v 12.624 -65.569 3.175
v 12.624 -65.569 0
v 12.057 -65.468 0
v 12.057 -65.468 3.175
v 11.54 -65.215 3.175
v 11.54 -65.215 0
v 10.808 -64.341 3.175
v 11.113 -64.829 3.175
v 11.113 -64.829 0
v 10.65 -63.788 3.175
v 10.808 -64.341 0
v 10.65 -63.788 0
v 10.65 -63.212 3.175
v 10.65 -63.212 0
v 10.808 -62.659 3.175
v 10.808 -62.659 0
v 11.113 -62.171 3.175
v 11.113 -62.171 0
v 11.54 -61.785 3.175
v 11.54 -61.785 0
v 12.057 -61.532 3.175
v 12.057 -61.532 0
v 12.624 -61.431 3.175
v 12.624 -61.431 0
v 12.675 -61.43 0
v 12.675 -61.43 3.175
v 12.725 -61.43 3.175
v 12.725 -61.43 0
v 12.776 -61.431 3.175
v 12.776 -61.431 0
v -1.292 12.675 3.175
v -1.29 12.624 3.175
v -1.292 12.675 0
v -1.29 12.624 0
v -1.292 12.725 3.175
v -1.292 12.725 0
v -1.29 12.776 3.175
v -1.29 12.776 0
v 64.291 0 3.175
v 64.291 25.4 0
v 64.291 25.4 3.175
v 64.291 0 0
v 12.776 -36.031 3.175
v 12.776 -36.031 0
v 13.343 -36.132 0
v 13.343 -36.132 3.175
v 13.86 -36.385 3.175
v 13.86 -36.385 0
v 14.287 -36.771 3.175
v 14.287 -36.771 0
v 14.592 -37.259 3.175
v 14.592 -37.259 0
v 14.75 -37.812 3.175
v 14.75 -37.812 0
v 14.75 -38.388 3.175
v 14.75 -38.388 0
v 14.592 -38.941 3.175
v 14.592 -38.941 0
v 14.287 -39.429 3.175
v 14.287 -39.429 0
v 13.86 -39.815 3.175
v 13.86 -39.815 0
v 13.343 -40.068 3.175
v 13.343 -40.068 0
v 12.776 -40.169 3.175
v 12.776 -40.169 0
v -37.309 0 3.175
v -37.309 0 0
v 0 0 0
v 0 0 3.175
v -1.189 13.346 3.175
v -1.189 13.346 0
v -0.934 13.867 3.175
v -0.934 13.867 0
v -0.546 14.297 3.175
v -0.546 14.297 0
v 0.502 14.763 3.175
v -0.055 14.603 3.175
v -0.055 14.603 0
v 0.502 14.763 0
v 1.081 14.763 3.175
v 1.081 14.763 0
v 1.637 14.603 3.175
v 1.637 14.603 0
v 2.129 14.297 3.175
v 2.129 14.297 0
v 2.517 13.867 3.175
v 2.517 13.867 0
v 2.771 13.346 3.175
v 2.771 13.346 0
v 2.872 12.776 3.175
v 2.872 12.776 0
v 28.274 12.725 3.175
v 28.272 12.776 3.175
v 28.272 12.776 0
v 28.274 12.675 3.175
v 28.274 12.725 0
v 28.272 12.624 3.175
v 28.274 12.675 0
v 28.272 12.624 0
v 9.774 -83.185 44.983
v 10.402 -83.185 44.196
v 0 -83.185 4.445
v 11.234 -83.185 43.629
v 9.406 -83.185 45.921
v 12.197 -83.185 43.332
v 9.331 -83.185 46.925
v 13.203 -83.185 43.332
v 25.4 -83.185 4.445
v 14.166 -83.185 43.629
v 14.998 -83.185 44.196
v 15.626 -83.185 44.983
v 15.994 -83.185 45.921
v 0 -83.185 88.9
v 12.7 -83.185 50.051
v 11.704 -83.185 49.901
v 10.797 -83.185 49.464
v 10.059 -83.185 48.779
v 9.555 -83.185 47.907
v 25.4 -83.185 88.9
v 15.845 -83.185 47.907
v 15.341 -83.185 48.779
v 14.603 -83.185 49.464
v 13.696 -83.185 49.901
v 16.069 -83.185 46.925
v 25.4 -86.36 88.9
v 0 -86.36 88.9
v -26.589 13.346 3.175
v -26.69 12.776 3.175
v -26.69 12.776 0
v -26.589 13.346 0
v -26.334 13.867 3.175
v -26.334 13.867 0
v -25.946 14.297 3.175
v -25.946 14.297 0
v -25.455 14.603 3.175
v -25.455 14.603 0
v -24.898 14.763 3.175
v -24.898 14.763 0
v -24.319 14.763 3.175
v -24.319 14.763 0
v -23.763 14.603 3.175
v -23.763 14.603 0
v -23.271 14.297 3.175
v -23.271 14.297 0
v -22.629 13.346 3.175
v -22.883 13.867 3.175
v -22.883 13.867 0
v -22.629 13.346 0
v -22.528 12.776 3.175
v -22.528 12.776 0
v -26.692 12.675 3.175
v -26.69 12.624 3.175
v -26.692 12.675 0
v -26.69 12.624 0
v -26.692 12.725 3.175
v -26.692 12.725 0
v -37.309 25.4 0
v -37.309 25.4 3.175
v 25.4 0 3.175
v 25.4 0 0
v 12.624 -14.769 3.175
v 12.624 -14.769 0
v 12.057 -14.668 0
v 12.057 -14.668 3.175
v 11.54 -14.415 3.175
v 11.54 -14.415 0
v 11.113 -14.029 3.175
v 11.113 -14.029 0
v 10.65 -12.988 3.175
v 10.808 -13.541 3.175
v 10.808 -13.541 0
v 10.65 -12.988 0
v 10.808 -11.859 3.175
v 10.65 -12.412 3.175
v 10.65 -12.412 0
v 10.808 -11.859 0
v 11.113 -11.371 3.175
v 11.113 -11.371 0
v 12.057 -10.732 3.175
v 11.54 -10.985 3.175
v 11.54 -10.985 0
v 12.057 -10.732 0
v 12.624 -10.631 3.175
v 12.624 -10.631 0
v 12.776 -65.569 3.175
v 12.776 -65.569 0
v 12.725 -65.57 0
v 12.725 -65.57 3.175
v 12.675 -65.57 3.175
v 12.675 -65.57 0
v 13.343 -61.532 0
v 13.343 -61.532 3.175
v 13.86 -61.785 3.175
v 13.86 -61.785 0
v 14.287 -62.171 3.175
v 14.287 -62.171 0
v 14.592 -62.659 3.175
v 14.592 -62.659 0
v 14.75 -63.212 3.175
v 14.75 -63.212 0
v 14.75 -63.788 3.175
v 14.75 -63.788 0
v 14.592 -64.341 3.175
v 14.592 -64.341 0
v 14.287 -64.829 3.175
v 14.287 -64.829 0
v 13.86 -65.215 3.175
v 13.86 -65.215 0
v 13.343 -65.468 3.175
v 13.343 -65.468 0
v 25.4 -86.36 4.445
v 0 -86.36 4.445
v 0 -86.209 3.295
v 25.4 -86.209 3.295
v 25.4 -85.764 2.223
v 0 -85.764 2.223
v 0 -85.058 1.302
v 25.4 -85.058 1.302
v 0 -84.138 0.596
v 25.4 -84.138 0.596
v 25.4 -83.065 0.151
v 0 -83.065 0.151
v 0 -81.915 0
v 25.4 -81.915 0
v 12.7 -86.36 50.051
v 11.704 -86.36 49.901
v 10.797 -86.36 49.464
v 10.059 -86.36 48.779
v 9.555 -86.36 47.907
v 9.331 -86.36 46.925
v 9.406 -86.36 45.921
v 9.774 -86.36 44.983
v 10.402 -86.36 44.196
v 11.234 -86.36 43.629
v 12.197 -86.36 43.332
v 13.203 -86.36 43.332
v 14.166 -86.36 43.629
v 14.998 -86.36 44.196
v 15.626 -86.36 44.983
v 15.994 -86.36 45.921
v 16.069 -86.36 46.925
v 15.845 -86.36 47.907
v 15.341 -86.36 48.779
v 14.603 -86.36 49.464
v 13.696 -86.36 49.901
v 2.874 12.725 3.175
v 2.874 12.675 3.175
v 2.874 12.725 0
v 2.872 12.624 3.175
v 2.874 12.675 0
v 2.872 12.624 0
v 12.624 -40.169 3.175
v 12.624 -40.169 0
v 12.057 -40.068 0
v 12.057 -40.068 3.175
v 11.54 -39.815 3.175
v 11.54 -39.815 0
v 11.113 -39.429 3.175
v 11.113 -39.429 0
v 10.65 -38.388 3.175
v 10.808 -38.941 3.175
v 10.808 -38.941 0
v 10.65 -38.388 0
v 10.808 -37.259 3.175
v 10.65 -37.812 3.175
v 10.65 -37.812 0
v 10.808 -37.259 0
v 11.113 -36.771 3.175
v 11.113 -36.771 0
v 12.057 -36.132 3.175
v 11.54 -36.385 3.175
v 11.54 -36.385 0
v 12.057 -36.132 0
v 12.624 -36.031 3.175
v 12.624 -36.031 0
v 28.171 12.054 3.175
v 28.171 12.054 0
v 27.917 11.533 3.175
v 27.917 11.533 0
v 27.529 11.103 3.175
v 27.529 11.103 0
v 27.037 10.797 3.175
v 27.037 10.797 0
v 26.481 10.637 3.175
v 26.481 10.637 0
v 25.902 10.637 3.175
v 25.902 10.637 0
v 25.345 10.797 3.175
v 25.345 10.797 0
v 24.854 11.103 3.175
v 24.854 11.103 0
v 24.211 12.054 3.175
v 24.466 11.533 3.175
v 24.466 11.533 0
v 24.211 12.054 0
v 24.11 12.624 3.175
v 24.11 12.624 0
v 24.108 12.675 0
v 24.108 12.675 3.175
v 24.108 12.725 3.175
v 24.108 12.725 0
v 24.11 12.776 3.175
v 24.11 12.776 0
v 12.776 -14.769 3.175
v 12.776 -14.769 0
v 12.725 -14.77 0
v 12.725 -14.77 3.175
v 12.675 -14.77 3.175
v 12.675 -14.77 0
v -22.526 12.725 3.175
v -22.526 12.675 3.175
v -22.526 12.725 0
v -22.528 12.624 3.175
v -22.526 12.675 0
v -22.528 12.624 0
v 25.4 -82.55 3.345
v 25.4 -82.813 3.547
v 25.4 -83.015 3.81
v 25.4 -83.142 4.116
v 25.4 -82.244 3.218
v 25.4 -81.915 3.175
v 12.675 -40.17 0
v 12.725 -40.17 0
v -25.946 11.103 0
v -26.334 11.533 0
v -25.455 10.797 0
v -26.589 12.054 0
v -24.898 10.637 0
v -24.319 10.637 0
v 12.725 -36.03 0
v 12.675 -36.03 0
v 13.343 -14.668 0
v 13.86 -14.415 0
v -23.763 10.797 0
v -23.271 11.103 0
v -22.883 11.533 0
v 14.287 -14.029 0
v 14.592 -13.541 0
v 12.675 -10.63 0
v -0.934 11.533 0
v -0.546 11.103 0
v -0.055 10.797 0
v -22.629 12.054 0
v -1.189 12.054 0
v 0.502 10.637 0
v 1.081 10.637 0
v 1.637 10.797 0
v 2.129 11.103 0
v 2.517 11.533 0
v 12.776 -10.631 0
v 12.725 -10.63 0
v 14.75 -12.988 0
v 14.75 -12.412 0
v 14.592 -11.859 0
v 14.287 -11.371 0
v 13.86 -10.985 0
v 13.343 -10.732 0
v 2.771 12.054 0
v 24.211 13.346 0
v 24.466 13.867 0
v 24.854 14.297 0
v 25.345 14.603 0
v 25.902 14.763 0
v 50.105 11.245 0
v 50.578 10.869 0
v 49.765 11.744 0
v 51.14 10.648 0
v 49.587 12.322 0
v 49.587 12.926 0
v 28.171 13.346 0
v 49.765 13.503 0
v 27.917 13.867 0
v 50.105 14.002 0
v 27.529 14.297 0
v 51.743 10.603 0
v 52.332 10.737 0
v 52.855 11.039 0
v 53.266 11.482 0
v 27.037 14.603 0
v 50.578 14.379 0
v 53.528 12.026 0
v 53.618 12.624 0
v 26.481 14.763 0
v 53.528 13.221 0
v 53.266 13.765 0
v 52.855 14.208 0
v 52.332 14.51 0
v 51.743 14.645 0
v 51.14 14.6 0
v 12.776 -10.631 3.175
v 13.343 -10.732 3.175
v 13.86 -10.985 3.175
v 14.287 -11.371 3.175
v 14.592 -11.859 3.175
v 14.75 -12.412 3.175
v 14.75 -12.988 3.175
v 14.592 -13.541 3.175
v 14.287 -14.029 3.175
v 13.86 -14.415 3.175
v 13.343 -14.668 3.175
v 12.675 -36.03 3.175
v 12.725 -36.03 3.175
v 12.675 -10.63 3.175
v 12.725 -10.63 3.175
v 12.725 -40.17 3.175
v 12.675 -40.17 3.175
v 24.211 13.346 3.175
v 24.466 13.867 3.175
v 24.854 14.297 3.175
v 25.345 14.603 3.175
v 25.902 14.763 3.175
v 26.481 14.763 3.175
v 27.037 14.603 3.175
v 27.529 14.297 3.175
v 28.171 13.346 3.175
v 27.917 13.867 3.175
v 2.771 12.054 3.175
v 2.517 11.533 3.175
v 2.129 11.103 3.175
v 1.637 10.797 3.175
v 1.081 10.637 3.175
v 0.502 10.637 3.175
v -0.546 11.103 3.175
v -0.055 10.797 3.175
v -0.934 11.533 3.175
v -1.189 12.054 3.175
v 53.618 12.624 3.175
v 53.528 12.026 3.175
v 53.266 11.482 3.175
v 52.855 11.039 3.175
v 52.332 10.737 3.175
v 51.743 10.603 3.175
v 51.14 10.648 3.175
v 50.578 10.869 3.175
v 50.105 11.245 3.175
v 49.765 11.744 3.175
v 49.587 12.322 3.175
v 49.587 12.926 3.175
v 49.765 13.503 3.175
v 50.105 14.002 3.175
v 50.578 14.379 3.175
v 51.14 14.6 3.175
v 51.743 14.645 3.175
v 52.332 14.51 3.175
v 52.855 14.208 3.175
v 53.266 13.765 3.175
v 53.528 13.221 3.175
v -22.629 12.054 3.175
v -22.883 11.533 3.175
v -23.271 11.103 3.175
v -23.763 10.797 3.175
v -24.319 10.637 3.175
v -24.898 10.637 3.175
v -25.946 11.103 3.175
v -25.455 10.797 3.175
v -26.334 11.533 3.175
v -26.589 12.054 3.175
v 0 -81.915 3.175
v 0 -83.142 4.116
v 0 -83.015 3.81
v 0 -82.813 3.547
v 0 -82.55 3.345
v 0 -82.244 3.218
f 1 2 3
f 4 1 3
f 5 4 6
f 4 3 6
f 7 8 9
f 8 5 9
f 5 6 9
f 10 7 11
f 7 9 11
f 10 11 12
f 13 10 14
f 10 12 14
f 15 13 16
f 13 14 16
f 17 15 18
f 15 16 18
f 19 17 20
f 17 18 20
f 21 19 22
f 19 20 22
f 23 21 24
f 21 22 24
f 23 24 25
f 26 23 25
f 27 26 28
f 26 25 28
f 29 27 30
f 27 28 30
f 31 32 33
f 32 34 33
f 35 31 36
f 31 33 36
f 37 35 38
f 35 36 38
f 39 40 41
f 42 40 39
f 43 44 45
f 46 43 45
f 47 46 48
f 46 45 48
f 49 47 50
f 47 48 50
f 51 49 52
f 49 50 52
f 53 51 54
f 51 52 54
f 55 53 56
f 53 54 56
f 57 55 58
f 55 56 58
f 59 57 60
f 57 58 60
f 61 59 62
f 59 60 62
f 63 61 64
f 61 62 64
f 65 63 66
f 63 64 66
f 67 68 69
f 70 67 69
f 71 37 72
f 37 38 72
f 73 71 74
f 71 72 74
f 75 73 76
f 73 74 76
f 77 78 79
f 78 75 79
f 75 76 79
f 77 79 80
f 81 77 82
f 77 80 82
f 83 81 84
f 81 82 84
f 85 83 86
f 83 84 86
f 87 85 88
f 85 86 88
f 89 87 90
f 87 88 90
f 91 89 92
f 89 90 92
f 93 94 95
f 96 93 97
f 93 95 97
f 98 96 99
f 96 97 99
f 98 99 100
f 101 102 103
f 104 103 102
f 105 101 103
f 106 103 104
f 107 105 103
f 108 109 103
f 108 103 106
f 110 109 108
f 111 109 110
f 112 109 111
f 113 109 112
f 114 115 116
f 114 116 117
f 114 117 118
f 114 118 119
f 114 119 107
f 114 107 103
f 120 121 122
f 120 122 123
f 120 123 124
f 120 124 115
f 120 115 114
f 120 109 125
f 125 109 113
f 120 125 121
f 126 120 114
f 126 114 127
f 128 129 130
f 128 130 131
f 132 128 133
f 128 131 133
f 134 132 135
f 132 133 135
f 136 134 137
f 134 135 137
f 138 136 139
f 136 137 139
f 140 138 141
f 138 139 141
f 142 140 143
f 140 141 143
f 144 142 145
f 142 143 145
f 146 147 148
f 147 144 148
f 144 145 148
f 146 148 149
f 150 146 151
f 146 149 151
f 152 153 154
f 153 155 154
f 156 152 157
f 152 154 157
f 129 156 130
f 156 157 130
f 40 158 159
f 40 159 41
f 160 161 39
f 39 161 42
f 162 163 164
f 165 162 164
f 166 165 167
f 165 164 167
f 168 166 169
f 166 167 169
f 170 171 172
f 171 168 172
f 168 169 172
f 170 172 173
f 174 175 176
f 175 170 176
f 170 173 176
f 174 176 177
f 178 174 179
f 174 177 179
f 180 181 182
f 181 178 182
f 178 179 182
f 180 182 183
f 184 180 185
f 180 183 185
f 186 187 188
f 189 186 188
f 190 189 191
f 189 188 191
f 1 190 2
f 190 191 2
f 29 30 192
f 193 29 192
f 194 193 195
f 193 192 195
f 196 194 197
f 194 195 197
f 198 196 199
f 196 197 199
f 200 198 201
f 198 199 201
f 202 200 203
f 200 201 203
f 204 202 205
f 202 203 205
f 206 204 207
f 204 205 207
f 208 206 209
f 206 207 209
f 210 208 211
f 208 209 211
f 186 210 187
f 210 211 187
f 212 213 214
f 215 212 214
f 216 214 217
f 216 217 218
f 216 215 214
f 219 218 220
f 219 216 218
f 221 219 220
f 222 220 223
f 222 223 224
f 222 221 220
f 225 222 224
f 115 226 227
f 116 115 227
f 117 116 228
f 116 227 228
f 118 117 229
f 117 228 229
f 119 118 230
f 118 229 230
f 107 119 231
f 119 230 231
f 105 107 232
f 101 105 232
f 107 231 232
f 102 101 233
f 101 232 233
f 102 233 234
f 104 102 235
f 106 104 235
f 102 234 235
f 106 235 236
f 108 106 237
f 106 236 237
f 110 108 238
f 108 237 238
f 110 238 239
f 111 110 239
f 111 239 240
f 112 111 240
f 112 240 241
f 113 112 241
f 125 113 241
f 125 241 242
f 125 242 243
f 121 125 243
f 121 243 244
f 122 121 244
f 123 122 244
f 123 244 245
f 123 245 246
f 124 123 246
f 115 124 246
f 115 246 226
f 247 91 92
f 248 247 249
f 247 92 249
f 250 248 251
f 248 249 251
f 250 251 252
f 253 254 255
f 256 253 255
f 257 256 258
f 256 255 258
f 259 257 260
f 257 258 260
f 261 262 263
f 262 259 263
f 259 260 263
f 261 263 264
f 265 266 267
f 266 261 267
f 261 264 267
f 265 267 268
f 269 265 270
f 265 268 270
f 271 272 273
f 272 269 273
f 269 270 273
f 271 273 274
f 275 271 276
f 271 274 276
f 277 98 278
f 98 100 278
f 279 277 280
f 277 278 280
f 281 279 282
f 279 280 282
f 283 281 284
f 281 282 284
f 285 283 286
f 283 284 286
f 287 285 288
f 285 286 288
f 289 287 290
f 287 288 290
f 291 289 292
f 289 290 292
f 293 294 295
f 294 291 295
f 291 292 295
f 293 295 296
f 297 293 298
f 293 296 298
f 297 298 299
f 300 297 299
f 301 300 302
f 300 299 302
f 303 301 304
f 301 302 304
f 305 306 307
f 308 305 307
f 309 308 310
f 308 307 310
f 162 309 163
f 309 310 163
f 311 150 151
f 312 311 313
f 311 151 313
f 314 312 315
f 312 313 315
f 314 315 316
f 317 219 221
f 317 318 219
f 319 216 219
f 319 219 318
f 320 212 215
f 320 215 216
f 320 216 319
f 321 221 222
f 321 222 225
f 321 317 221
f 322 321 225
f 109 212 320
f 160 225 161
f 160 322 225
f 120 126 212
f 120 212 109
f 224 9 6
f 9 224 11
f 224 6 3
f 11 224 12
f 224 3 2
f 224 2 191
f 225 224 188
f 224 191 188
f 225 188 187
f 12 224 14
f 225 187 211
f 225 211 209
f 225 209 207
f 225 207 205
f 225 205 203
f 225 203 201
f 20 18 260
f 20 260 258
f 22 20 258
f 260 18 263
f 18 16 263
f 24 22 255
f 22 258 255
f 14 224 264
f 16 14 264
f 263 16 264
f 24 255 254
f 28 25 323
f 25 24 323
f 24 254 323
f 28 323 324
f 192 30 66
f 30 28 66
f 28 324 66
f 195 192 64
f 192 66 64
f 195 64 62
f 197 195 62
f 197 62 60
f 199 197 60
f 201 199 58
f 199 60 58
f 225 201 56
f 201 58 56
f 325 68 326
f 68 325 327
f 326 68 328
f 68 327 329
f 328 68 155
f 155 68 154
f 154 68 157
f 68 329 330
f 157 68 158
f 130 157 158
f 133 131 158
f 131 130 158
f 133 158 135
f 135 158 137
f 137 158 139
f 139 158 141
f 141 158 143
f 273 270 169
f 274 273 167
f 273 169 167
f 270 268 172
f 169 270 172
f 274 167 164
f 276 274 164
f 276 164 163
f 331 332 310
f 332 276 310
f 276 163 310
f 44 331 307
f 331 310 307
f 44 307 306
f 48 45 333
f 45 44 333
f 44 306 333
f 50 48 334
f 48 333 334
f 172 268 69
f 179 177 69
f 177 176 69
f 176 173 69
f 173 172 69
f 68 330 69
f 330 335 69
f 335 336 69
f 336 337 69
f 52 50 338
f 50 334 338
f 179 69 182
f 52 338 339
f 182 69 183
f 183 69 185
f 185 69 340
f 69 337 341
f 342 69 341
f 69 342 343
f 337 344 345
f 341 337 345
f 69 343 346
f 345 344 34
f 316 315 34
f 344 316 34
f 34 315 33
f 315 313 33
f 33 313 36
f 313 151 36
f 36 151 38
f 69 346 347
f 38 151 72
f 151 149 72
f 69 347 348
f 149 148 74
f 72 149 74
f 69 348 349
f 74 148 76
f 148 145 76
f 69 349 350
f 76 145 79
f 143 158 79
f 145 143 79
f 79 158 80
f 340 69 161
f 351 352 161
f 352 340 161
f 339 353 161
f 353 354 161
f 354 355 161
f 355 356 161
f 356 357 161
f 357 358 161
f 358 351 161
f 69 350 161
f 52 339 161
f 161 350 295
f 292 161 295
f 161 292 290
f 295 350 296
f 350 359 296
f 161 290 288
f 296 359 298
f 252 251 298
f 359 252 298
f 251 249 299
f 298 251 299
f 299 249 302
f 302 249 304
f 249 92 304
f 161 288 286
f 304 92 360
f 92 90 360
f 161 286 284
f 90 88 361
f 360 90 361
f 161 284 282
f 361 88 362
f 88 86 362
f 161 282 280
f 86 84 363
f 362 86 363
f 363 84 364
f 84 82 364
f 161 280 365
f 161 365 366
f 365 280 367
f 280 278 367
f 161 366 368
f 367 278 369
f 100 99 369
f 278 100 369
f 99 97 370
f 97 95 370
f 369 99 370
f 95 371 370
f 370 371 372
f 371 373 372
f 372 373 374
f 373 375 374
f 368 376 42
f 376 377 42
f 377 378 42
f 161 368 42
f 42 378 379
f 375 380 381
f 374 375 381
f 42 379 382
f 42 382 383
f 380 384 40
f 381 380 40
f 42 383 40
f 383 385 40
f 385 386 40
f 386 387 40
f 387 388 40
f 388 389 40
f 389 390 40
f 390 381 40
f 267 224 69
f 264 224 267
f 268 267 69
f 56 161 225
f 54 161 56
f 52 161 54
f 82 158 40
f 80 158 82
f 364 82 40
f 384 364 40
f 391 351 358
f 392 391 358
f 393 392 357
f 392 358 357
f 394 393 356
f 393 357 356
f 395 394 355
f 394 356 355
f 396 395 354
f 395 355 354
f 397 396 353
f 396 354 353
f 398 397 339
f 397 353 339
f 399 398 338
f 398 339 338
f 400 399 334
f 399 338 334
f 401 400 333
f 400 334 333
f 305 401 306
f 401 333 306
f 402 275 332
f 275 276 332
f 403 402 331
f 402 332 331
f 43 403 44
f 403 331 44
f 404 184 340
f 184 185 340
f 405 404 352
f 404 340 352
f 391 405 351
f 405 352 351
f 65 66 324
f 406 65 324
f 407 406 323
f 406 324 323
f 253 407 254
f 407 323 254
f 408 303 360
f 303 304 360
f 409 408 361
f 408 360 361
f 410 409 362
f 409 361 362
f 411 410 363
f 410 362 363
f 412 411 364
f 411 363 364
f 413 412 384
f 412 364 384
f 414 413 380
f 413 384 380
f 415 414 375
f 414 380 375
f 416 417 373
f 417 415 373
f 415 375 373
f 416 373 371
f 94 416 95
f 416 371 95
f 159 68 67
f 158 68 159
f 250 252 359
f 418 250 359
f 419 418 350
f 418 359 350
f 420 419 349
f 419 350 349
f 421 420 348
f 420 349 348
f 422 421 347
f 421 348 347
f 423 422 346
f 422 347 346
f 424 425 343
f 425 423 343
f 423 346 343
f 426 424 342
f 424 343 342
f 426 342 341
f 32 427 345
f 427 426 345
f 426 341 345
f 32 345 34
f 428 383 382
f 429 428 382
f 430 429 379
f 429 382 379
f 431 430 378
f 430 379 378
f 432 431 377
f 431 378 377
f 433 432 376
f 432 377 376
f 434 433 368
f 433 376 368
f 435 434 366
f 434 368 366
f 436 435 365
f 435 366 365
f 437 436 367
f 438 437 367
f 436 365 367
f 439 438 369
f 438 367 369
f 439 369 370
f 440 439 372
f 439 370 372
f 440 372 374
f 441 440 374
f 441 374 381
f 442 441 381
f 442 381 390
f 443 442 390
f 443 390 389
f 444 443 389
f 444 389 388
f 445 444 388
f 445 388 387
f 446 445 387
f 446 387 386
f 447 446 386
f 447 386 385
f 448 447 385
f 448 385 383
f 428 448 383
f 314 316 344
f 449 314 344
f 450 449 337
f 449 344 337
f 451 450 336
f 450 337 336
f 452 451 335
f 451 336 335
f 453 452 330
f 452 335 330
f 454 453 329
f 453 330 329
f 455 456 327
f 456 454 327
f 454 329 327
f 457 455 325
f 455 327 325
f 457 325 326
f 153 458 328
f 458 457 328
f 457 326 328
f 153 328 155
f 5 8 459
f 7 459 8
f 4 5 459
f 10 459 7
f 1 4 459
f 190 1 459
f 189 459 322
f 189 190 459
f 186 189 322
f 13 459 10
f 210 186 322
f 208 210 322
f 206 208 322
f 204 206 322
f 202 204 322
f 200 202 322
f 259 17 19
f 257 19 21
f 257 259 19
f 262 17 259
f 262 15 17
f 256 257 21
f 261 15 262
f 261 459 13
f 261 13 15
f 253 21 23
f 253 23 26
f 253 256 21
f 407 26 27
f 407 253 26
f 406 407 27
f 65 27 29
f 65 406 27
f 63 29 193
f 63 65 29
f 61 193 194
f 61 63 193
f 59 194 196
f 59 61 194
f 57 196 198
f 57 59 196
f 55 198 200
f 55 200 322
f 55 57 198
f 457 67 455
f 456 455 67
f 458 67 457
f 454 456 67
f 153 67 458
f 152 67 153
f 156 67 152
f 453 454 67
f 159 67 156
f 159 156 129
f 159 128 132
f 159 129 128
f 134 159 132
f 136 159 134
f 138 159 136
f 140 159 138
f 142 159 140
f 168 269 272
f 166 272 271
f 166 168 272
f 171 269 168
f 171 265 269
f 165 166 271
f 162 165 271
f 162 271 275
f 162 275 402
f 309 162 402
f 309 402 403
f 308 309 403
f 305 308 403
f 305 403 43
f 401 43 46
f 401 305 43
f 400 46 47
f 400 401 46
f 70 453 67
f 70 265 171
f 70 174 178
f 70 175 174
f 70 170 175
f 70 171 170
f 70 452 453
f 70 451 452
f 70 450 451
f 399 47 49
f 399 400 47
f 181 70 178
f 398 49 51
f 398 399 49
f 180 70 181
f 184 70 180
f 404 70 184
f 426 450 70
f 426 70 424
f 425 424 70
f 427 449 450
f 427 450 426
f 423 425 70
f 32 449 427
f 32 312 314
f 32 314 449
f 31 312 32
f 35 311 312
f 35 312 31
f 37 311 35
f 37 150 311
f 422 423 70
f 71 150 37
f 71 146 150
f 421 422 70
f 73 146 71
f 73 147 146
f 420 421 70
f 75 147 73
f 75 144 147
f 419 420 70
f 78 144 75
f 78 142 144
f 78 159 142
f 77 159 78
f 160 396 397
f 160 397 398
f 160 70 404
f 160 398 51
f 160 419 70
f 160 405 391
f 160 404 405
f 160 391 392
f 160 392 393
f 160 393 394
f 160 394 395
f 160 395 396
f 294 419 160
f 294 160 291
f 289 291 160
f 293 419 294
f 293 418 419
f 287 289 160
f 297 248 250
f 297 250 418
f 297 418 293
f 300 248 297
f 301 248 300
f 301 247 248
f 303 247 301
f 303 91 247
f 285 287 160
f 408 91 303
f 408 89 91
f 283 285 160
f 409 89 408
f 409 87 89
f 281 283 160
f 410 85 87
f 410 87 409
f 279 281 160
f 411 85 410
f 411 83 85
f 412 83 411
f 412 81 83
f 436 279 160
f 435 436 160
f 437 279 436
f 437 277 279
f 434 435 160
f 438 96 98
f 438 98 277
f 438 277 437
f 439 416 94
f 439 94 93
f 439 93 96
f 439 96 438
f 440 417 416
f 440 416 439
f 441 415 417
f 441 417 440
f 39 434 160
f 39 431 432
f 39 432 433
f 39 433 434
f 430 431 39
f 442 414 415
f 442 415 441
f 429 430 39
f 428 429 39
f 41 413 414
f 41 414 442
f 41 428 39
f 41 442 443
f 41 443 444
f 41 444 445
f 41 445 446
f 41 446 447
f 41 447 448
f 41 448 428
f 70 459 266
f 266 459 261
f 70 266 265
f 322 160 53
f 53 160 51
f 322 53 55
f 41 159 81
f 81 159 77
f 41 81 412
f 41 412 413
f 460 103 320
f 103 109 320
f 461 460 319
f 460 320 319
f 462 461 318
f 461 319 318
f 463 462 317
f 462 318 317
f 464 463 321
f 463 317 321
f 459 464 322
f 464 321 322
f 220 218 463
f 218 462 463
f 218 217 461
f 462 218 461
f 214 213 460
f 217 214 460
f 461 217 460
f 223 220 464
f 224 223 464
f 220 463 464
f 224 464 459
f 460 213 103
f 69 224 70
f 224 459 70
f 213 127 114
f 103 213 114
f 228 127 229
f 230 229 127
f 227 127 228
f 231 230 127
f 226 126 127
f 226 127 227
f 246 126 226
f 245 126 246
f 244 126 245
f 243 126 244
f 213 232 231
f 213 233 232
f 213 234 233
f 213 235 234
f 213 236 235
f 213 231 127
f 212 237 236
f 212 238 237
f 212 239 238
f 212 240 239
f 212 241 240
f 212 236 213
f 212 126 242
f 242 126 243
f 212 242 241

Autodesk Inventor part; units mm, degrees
ref_plane "YZ Plane" through (0, 0, 0) normal (1, 0, 0) x (0, 1, 0)
ref_plane "XZ Plane" through (0, 0, 0) normal (0, 1, 0) x (-1, 0, 0)
ref_plane "XY Plane" through (0, 0, 0) normal (0, 0, 1) x (1, 0, 0)
sketch "Sketch1" plane through (0, 0, 0) normal (0, 0, 1) x (1, 0, 0)
  line L0 (0, -83.185) -> (12.6238, -83.185)
  line L1 (12.6238, -83.185) -> (12.6238, -65.5687)
  arc A0 (12.6238, -61.4313) -> (12.6238, -65.5687) centre (12.7, -63.5) ccw
  line L2 (12.6238, -61.4313) -> (12.6238, -40.1687)
  arc A1 (12.6238, -36.0313) -> (12.6238, -40.1687) centre (12.7, -38.1) ccw
  line L3 (12.6238, -36.0313) -> (12.6238, -14.7687)
  arc A2 (12.6238, -10.6313) -> (12.6238, -14.7687) centre (12.7, -12.7) ccw
  line L4 (12.6238, -10.6313) -> (12.6238, 0)
  line L5 (0, 0) -> (12.6238, 0)
  line L6 (0, 0) -> (0, -83.185)
  line L7 (12.7762, -83.185) -> (25.4, -83.185)
  line L8 (25.4, 0) -> (25.4, -83.185)
  line L9 (12.7762, 0) -> (25.4, 0)
  line L10 (12.7762, -10.6313) -> (12.7762, 0)
  arc A3 (12.7762, -14.7687) -> (12.7762, -10.6313) centre (12.7, -12.7) ccw
  line L11 (12.7762, -36.0313) -> (12.7762, -14.7687)
  arc A4 (12.7762, -40.1687) -> (12.7762, -36.0313) centre (12.7, -38.1) ccw
  line L12 (12.7762, -61.4313) -> (12.7762, -40.1687)
  arc A5 (12.7762, -65.5687) -> (12.7762, -61.4313) centre (12.7, -63.5) ccw
  line L13 (12.7762, -83.185) -> (12.7762, -65.5687)
  line L14 (216.6911, 0) -> (216.6911, 12.6238)
  line L15 (216.6911, 12.6238) -> (206.0725, 12.6238)
  arc A6 (201.9097, 12.6238) -> (206.0725, 12.6238) centre (203.9911, 12.7) ccw
  line L16 (201.9097, 12.6238) -> (180.6725, 12.6238)
  arc A7 (176.5097, 12.6238) -> (180.6725, 12.6238) centre (178.5911, 12.7) ccw
  line L17 (176.5097, 12.6238) -> (155.2725, 12.6238)
  arc A8 (151.1097, 12.6238) -> (155.2725, 12.6238) centre (153.1911, 12.7) ccw
  line L18 (151.1097, 12.6238) -> (129.8725, 12.6238)
  arc A9 (125.7097, 12.6238) -> (129.8725, 12.6238) centre (127.7911, 12.7) ccw
  line L19 (125.7097, 12.6238) -> (104.4725, 12.6238)
  arc A10 (100.3097, 12.6238) -> (104.4725, 12.6238) centre (102.3911, 12.7) ccw
  line L20 (100.3097, 12.6238) -> (79.0725, 12.6238)
  arc A11 (74.9097, 12.6238) -> (79.0725, 12.6238) centre (76.9911, 12.7) ccw
  line L21 (74.9097, 12.6238) -> (53.6725, 12.6238)
  arc A12 (49.5097, 12.6238) -> (53.6725, 12.6238) centre (51.5911, 12.7) ccw
  line L22 (49.5097, 12.6238) -> (28.2725, 12.6238)
  arc A13 (24.1097, 12.6238) -> (28.2725, 12.6238) centre (26.1911, 12.7) ccw
  line L23 (24.1097, 12.6238) -> (2.8725, 12.6238)
  arc A14 (-1.2903, 12.6238) -> (2.8725, 12.6238) centre (0.7911, 12.7) ccw
  line L24 (-1.2903, 12.6238) -> (-22.5275, 12.6238)
  arc A15 (-26.6903, 12.6238) -> (-22.5275, 12.6238) centre (-24.6089, 12.7) ccw
  line L25 (-26.6903, 12.6238) -> (-47.9275, 12.6238)
  arc A16 (-52.0903, 12.6238) -> (-47.9275, 12.6238) centre (-50.0089, 12.7) ccw
  line L26 (-52.0903, 12.6238) -> (-73.3275, 12.6238)
  arc A17 (-77.4903, 12.6238) -> (-73.3275, 12.6238) centre (-75.4089, 12.7) ccw
  line L27 (-77.4903, 12.6238) -> (-98.7275, 12.6238)
  arc A18 (-102.8903, 12.6238) -> (-98.7275, 12.6238) centre (-100.8089, 12.7) ccw
  line L28 (-102.8903, 12.6238) -> (-124.1275, 12.6238)
  arc A19 (-128.2903, 12.6238) -> (-124.1275, 12.6238) centre (-126.2089, 12.7) ccw
  line L29 (-128.2903, 12.6238) -> (-149.5275, 12.6238)
  arc A20 (-153.6903, 12.6238) -> (-149.5275, 12.6238) centre (-151.6089, 12.7) ccw
  line L30 (-153.6903, 12.6238) -> (-174.9275, 12.6238)
  arc A21 (-179.0903, 12.6238) -> (-174.9275, 12.6238) centre (-177.0089, 12.7) ccw
  line L31 (-179.0903, 12.6238) -> (-200.3275, 12.6238)
  arc A22 (-204.4903, 12.6238) -> (-200.3275, 12.6238) centre (-202.4089, 12.7) ccw
  line L32 (-204.4903, 12.6238) -> (-225.7275, 12.6238)
  arc A23 (-229.8903, 12.6238) -> (-225.7275, 12.6238) centre (-227.8089, 12.7) ccw
  line L33 (-229.8903, 12.6238) -> (-251.1275, 12.6238)
  arc A24 (-255.2903, 12.6238) -> (-251.1275, 12.6238) centre (-253.2089, 12.7) ccw
  line L34 (-255.2903, 12.6238) -> (-276.5275, 12.6238)
  arc A25 (-280.6903, 12.6238) -> (-276.5275, 12.6238) centre (-278.6089, 12.7) ccw
  line L35 (-280.6903, 12.6238) -> (-301.9275, 12.6238)
  arc A26 (-306.0903, 12.6238) -> (-301.9275, 12.6238) centre (-304.0089, 12.7) ccw
  line L36 (-306.0903, 12.6238) -> (-327.3275, 12.6238)
  arc A27 (-331.4903, 12.6238) -> (-327.3275, 12.6238) centre (-329.4089, 12.7) ccw
  line L37 (-331.4903, 12.6238) -> (-352.7275, 12.6238)
  arc A28 (-356.8903, 12.6238) -> (-352.7275, 12.6238) centre (-354.8089, 12.7) ccw
  line L38 (-356.8903, 12.6238) -> (-378.1275, 12.6238)
  arc A29 (-382.2903, 12.6238) -> (-378.1275, 12.6238) centre (-380.2089, 12.7) ccw
  line L39 (-382.2903, 12.6238) -> (-403.5275, 12.6238)
  arc A30 (-407.6903, 12.6238) -> (-403.5275, 12.6238) centre (-405.6089, 12.7) ccw
  line L40 (-407.6903, 12.6238) -> (-418.3089, 12.6238)
  line L41 (-418.3089, 12.6238) -> (-418.3089, 0)
  line L42 (-418.3089, 0) -> (216.6911, 0)
  line L43 (216.6911, 12.7762) -> (216.6911, 25.4)
  line L44 (-418.3089, 25.4) -> (216.6911, 25.4)
  line L45 (-418.3089, 25.4) -> (-418.3089, 12.7762)
  line L46 (-418.3089, 12.7762) -> (-407.6903, 12.7762)
  arc A31 (-403.5275, 12.7762) -> (-407.6903, 12.7762) centre (-405.6089, 12.7) ccw
  line L47 (-403.5275, 12.7762) -> (-382.2903, 12.7762)
  arc A32 (-378.1275, 12.7762) -> (-382.2903, 12.7762) centre (-380.2089, 12.7) ccw
  line L48 (-378.1275, 12.7762) -> (-356.8903, 12.7762)
  arc A33 (-352.7275, 12.7762) -> (-356.8903, 12.7762) centre (-354.8089, 12.7) ccw
  line L49 (-352.7275, 12.7762) -> (-331.4903, 12.7762)
  arc A34 (-327.3275, 12.7762) -> (-331.4903, 12.7762) centre (-329.4089, 12.7) ccw
  line L50 (-327.3275, 12.7762) -> (-306.0903, 12.7762)
  arc A35 (-301.9275, 12.7762) -> (-306.0903, 12.7762) centre (-304.0089, 12.7) ccw
  line L51 (-301.9275, 12.7762) -> (-280.6903, 12.7762)
  arc A36 (-276.5275, 12.7762) -> (-280.6903, 12.7762) centre (-278.6089, 12.7) ccw
  line L52 (-276.5275, 12.7762) -> (-255.2903, 12.7762)
  arc A37 (-251.1275, 12.7762) -> (-255.2903, 12.7762) centre (-253.2089, 12.7) ccw
  line L53 (-251.1275, 12.7762) -> (-229.8903, 12.7762)
  arc A38 (-225.7275, 12.7762) -> (-229.8903, 12.7762) centre (-227.8089, 12.7) ccw
  line L54 (-225.7275, 12.7762) -> (-204.4903, 12.7762)
  arc A39 (-200.3275, 12.7762) -> (-204.4903, 12.7762) centre (-202.4089, 12.7) ccw
  line L55 (-200.3275, 12.7762) -> (-179.0903, 12.7762)
  arc A40 (-174.9275, 12.7762) -> (-179.0903, 12.7762) centre (-177.0089, 12.7) ccw
  line L56 (-174.9275, 12.7762) -> (-153.6903, 12.7762)
  arc A41 (-149.5275, 12.7762) -> (-153.6903, 12.7762) centre (-151.6089, 12.7) ccw
  line L57 (-149.5275, 12.7762) -> (-128.2903, 12.7762)
  arc A42 (-124.1275, 12.7762) -> (-128.2903, 12.7762) centre (-126.2089, 12.7) ccw
  line L58 (-124.1275, 12.7762) -> (-102.8903, 12.7762)
  arc A43 (-98.7275, 12.7762) -> (-102.8903, 12.7762) centre (-100.8089, 12.7) ccw
  line L59 (-98.7275, 12.7762) -> (-77.4903, 12.7762)
  arc A44 (-73.3275, 12.7762) -> (-77.4903, 12.7762) centre (-75.4089, 12.7) ccw
  line L60 (-73.3275, 12.7762) -> (-52.0903, 12.7762)
  arc A45 (-47.9275, 12.7762) -> (-52.0903, 12.7762) centre (-50.0089, 12.7) ccw
  line L61 (-47.9275, 12.7762) -> (-26.6903, 12.7762)
  arc A46 (-22.5275, 12.7762) -> (-26.6903, 12.7762) centre (-24.6089, 12.7) ccw
  line L62 (-22.5275, 12.7762) -> (-1.2903, 12.7762)
  arc A47 (2.8725, 12.7762) -> (-1.2903, 12.7762) centre (0.7911, 12.7) ccw
  line L63 (2.8725, 12.7762) -> (24.1097, 12.7762)
  arc A48 (28.2725, 12.7762) -> (24.1097, 12.7762) centre (26.1911, 12.7) ccw
  line L64 (28.2725, 12.7762) -> (49.5097, 12.7762)
  arc A49 (53.6725, 12.7762) -> (49.5097, 12.7762) centre (51.5911, 12.7) ccw
  line L65 (53.6725, 12.7762) -> (74.9097, 12.7762)
  arc A50 (79.0725, 12.7762) -> (74.9097, 12.7762) centre (76.9911, 12.7) ccw
  line L66 (79.0725, 12.7762) -> (100.3097, 12.7762)
  arc A51 (104.4725, 12.7762) -> (100.3097, 12.7762) centre (102.3911, 12.7) ccw
  line L67 (104.4725, 12.7762) -> (125.7097, 12.7762)
  arc A52 (129.8725, 12.7762) -> (125.7097, 12.7762) centre (127.7911, 12.7) ccw
  line L68 (129.8725, 12.7762) -> (151.1097, 12.7762)
  arc A53 (155.2725, 12.7762) -> (151.1097, 12.7762) centre (153.1911, 12.7) ccw
  line L69 (155.2725, 12.7762) -> (176.5097, 12.7762)
  arc A54 (180.6725, 12.7762) -> (176.5097, 12.7762) centre (178.5911, 12.7) ccw
  line L70 (180.6725, 12.7762) -> (201.9097, 12.7762)
  arc A55 (206.0725, 12.7762) -> (201.9097, 12.7762) centre (203.9911, 12.7) ccw
  line L71 (206.0725, 12.7762) -> (216.6911, 12.7762)
  line L72 (-37.3089, 25.4) -> (64.2911, 25.4)
  line L73 (64.2911, 25.4) -> (64.2911, 0)
  line L74 (64.2911, 0) -> (-37.3089, 0)
  line L75 (-37.3089, 0) -> (-37.3089, 25.4)
  line L76 (0, 0) -> (25.4, 0)
  line L77 (25.4, 0) -> (25.4, -83.185)
  line L78 (25.4, -83.185) -> (0, -83.185)
  line L79 (0, -83.185) -> (0, 0)
  circle A56 centre (-24.6089, 12.7) radius 2.0828
  circle A57 centre (0.7911, 12.7) radius 2.0828
  circle A58 centre (26.1911, 12.7) radius 2.0828
  circle A59 centre (51.5911, 12.6238) radius 2.0267
  circle A60 centre (12.7, -12.7) radius 2.0701
  circle A61 centre (12.7, -38.1) radius 2.0701
  circle A62 centre (12.7, -63.5) radius 2.0701
  line L80 (242.0911, -84.7725) -> (-443.7089, -84.7725)
  line L81 (242.0911, -84.7725) -> (-443.7089, -84.7725)
  line L82 (-443.7089, -86.36) -> (-443.7089, -84.7725)
  line L83 (-442.1214, -86.36) -> (-443.7089, -86.36)
  line L84 (-442.1214, -86.36) -> (240.5036, -86.36)
  line L85 (242.0911, -86.36) -> (240.5036, -86.36)
  line L86 (242.0911, -84.7725) -> (242.0911, -86.36)
  line L87 (-442.1214, -137.16) -> (-442.1214, -86.36)
  line L88 (-442.1214, -137.16) -> (240.5036, -137.16)
  line L89 (240.5036, -86.36) -> (240.5036, -137.16)
  line L90 (-442.1214, -86.36) -> (240.5036, -86.36)
  line L91 (0, -83.185) -> (25.4, -83.185)
  line L92 (0, -83.185) -> (25.4, -83.185)
  line L93 (25.4, -84.7725) -> (0, -84.7725)
  line L94 (-5.08, -83.185) -> (30.48, -83.185)
  line L95 (-5.08, -83.185) -> (30.48, -83.185)
  line L96 (-5.08, -83.185) -> (30.48, -83.185)
extrude "Plate1" add sketch "Sketch1" along normal blind 3.175 contours L6 L5 L4 A2 L3 A1 L2 A0 L1 L0 | L1 A62 L13 L78 | L42 L75 L25 A15 L24 A14 L23 A13 L22 A12 A59 L21 L73 L9 L5 | L13 A5 L12 A4 L11 A3 L10 L9 L8 L7 | L42 L10 A60 L4 | L2 A61 L12 A62 | L75 L61 A56 L25 | A60 L11 A61 L3 | L75 L44 L73 L65 A49 L64 A48 L63 A47 L62 A46 L61 | A56 L62 A57 L24 | L21 A12 A59 L22 A58 L64 A49 L65 L73 | A57 L63 A58 L23
sketch "Sketch4" plane through (25.4, -83.185, 3.175) normal (0, -1, 0) x (1, 0, 0)
  line L0 (-25.4, 0) -> (0, 0)
  line L1 (0, 0) -> (0, 85.725)
  line L2 (0, 85.725) -> (-25.4, 85.725)
  line L3 (-25.4, 85.725) -> (-25.4, 0)
edge flange "Flange2" height 88.9 angle 90 thickness 3.175 bend radius 1.27 thickness toward (0, -1, 0) relief tear relief width 3.175 relief depth 1.5875 edges at (12.7, -83.185, 3.175) wall of the first edge with corners at (0, -83.185, 3.175) (25.4, -83.185, 3.175) (25.4, -83.185, 88.9) (0, -83.185, 88.9)
bend "Bend2"
corner "Corner2"
sketch "Sketch5" plane through (0, -83.185, 88.9) normal (0, 1, 0) x (1, 0, 0)
  line L0 (0, 84.455) -> (25.4, 0)
  line L1 (0, 0) -> (25.4, 84.455)
  circle A0 centre (12.7, 42.2275) radius 3.3782
  point P0 (0, 88.9)
  dimension "d29" = 6.7564
hole "Hole2" at (12.7, -83.185, 46.6725) direction (0, -1, 0) diameter 6.7564 end through all
equation "\"d35\" = Thickness"
equation "\"d19\" = BendReliefWidth"
equation "\"d20\" = BendReliefDepth"
equation "\"d21\" = MinimumRemnant"
equation "\"d22\" = BendRadius"
equation "\"d26\" = CornerReliefSize"
equation "\"d27\" = GapSize"
equation "\"d28\" = JacobiRadiusSize"
equation "\"BendRadius\" = Thickness"
equation "\"BendReliefWidth\" = Thickness"
equation "\"BendReliefDepth\" = 0.5 * Thickness"
equation "\"CornerReliefSize\" = 4 * Thickness"
equation "\"MinimumRemnant\" = 2 * Thickness"
equation "\"TransitionRadius\" = BendRadius"
equation "\"JacobiRadiusSize\" = BendRadius"
equation "\"GapSize\" = Thickness"
equation "\"d0\" = BendRadius"
equation "\"Thickness\" = 3.175"
properties part number "Angle attach bracket"
